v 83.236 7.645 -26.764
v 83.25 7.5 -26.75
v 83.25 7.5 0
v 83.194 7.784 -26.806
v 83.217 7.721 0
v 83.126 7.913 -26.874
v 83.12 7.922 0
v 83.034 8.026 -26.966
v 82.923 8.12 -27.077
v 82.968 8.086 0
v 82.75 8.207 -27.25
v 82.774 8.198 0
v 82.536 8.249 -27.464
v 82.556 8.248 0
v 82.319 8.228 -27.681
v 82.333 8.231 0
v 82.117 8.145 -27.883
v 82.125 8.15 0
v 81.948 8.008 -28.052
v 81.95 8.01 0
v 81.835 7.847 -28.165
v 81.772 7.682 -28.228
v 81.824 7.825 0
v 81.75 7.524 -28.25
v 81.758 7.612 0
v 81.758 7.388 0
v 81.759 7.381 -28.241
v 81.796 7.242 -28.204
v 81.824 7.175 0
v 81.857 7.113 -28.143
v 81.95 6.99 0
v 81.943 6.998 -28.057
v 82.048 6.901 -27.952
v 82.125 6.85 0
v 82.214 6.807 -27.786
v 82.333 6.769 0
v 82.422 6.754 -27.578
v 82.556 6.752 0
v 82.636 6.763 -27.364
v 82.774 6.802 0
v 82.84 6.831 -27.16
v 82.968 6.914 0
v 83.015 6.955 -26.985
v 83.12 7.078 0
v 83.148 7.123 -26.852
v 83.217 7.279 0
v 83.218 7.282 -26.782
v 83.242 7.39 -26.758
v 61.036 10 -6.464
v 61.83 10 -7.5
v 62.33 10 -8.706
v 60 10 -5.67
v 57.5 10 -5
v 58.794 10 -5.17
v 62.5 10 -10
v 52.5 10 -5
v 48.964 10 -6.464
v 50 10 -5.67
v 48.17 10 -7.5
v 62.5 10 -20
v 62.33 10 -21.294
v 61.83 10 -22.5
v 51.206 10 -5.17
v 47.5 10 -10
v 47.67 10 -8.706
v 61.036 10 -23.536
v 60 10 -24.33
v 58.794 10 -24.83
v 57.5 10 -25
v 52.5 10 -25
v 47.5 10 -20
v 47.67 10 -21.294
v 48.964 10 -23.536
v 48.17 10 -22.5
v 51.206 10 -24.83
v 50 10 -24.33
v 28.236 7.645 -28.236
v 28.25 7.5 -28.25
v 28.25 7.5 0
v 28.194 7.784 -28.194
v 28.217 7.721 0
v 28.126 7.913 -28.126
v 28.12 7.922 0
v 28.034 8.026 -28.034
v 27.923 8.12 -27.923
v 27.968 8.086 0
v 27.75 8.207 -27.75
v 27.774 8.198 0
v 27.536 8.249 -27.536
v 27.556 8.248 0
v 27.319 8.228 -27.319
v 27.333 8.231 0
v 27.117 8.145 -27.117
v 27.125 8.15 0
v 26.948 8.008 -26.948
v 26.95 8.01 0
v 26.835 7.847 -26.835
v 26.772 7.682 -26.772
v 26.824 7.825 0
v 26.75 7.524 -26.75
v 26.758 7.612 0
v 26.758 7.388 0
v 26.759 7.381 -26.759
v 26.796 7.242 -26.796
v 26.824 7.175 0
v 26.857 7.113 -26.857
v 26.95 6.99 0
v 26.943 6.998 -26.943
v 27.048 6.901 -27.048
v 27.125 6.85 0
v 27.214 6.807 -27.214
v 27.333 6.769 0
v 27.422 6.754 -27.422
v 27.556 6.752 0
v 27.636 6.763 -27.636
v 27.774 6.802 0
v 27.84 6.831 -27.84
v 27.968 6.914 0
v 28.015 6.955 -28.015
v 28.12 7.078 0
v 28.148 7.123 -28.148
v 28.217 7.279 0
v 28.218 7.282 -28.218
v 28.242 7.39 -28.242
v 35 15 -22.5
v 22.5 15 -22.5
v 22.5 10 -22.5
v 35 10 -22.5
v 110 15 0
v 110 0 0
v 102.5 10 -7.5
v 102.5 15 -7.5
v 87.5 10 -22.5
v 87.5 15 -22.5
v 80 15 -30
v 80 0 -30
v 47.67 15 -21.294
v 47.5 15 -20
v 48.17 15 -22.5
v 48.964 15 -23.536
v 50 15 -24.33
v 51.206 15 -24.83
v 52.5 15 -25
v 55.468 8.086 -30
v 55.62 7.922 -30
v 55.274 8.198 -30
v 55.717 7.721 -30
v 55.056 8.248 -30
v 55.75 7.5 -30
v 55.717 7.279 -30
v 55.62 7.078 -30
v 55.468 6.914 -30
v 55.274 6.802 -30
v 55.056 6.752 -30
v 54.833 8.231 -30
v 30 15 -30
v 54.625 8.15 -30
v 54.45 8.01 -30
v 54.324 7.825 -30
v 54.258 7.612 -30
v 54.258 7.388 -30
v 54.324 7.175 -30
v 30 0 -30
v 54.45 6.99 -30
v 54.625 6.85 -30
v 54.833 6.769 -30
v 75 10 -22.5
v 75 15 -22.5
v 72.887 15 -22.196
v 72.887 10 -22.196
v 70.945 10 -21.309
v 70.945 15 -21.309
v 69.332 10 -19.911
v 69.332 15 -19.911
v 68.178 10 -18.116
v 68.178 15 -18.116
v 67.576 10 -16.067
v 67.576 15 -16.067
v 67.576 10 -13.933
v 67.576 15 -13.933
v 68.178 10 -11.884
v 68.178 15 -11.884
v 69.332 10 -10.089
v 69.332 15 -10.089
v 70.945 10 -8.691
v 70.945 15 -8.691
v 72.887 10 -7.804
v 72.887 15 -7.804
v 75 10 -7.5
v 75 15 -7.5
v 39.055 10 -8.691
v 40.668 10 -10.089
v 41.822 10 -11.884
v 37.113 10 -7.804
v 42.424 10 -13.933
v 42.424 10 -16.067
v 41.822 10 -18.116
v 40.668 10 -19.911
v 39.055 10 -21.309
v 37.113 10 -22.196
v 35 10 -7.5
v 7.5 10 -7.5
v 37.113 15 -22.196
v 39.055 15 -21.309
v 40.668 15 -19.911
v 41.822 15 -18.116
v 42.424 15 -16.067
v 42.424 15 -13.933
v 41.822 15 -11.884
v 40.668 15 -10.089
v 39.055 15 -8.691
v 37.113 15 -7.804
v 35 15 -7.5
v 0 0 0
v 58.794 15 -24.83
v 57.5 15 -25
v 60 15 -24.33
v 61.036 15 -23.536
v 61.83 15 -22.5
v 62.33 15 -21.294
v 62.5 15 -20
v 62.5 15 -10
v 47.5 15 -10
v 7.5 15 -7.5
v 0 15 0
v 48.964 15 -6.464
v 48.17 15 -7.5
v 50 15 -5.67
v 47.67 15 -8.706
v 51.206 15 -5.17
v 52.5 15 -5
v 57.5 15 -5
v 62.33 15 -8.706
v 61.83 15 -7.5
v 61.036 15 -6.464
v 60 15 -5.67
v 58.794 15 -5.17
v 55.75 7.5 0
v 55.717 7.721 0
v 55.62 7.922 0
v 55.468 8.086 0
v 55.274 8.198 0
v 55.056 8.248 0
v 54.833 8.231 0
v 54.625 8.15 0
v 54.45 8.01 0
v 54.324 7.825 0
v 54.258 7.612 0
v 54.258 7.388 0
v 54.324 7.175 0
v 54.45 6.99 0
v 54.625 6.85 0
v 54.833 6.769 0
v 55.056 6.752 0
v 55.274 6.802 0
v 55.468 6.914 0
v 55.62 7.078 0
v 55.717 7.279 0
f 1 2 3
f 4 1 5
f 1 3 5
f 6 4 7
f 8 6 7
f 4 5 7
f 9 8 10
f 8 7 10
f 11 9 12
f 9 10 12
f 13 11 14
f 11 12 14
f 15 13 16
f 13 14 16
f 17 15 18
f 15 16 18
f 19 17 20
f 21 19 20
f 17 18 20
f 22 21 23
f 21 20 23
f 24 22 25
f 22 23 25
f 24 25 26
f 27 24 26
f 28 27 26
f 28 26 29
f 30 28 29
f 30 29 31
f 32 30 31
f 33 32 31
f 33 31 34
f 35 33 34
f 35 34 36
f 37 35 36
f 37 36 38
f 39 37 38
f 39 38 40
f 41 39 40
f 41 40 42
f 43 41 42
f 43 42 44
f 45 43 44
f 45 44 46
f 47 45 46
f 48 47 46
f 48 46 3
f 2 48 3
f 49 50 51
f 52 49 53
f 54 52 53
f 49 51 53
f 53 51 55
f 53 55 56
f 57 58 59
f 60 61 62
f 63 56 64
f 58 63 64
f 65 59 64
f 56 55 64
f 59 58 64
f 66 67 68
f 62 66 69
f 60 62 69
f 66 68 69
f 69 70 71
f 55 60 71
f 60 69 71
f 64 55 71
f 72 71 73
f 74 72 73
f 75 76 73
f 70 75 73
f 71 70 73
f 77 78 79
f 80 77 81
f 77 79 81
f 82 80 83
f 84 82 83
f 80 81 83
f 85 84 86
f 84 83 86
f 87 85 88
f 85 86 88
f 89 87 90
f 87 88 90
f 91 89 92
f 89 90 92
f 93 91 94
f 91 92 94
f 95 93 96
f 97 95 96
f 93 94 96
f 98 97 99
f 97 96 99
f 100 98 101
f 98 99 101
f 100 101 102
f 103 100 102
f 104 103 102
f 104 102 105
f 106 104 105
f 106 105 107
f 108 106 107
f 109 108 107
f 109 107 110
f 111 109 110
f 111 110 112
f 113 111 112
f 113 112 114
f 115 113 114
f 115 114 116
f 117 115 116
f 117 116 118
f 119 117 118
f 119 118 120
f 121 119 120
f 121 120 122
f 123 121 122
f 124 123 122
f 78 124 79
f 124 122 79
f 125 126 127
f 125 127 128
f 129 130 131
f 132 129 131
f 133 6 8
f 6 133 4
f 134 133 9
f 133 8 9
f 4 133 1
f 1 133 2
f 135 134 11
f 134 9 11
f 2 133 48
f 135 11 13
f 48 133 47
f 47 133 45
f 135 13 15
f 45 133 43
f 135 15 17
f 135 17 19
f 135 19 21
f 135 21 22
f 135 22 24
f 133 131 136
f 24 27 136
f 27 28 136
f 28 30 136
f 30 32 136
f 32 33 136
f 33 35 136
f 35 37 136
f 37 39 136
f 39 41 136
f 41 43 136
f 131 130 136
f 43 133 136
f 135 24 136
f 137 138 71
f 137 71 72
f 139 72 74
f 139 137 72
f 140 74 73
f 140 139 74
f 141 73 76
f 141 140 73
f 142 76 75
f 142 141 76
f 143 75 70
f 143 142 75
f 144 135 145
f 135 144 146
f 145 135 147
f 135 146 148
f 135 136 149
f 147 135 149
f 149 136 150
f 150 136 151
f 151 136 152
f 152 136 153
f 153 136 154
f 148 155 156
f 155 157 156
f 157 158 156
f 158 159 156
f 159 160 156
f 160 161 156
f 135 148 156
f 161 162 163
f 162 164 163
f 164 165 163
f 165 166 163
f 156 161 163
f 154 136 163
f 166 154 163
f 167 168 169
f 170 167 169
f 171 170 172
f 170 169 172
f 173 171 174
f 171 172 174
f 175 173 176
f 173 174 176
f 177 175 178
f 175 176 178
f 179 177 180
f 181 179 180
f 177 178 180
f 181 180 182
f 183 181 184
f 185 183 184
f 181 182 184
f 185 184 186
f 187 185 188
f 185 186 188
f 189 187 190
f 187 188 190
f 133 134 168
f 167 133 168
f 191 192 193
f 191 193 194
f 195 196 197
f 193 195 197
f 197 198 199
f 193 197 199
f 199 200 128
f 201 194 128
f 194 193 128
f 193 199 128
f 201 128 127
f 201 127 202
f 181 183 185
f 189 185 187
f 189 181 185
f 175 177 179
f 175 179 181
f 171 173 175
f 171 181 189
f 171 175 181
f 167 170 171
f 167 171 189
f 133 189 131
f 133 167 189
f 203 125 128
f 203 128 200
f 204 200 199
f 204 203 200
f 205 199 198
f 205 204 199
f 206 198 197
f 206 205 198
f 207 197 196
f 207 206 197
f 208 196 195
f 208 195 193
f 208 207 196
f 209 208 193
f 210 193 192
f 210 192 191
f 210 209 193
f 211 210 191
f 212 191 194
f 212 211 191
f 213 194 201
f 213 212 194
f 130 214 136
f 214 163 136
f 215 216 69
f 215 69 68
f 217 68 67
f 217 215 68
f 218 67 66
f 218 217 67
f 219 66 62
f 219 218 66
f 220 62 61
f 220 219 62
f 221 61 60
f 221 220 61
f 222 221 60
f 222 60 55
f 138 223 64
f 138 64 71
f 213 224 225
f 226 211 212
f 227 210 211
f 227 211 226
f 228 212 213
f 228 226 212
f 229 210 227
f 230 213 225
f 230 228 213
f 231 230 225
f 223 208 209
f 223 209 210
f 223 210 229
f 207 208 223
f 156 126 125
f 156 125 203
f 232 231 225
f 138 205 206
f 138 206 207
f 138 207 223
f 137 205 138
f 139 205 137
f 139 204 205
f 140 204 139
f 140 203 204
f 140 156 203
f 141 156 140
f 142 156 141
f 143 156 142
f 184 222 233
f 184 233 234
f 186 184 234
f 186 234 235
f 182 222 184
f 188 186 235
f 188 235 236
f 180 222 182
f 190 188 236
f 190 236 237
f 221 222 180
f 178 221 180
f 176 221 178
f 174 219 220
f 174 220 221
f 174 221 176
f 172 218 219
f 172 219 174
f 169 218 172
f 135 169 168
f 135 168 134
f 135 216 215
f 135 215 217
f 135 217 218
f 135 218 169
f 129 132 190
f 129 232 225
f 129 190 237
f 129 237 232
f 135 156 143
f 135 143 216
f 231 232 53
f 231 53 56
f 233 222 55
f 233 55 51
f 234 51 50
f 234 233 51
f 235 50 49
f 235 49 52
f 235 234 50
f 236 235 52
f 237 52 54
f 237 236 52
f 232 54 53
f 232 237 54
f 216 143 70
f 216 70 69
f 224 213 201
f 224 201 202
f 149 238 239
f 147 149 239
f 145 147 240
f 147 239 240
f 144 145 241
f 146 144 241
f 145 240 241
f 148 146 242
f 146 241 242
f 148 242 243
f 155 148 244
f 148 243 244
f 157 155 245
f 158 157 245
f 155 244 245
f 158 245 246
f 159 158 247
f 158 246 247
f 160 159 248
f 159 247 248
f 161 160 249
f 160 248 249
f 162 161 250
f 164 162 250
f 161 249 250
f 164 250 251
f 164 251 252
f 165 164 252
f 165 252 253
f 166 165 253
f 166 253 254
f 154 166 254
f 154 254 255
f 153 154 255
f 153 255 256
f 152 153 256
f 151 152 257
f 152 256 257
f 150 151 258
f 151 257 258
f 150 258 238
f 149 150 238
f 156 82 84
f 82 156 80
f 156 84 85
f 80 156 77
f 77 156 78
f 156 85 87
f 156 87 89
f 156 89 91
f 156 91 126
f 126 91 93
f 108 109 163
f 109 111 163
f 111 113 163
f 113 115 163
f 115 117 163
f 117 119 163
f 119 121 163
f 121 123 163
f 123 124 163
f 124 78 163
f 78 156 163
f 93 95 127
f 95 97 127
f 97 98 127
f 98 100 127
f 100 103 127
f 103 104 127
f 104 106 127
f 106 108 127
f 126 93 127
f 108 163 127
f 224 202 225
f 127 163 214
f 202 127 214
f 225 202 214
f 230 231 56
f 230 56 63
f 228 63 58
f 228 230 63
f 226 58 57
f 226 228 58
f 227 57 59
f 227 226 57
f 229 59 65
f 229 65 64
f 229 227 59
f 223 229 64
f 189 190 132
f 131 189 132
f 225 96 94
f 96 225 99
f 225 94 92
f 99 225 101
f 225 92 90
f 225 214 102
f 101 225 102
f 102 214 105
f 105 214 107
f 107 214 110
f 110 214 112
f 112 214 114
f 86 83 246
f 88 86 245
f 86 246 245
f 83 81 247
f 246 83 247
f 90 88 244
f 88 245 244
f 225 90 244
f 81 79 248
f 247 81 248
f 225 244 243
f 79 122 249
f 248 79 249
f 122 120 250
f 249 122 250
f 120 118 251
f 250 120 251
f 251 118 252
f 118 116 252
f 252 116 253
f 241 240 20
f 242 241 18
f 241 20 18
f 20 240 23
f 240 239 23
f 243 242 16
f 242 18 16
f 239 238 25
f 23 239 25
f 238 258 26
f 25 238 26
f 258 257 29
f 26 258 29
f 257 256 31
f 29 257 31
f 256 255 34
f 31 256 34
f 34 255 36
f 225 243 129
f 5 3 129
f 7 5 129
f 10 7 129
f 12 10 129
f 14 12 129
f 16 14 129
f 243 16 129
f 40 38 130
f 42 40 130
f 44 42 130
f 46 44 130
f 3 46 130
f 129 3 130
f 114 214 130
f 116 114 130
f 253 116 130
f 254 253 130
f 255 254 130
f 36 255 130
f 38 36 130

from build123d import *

# Parameters (mm, degrees)
BOSS_EXTRUDE1_DEPTH = 15
CUT_EXTRUDE1_DEPTH  = 5
SKETCH3_R           = 0.75
CUT_EXTRUDE2_DEPTH  = 30
CUT_EXTRUDE3_DEPTH  = 5


with BuildPart() as part:
    # Sketch1 → Boss-Extrude1 (new body)
    with BuildSketch(Plane(origin=(0, 0, 0), x_dir=(1, 0, 0), z_dir=(0, 1, 0))):
        Polygon((0, 0), (110, 0), (80, 30), (30, 30), align=None)
    extrude(amount=BOSS_EXTRUDE1_DEPTH)

    # Sketch2 → Cut-Extrude1 (cut)
    with BuildSketch(Plane(origin=(0, 15, 0), x_dir=(1, 0, 0), z_dir=(0, 1, 0))):
        with BuildLine():
            Line((-5, 22.5), (35, 22.5))
            ThreePointArc((35, 22.5), (42.5, 15), (35, 7.5))
            Line((35, 7.5), (-5, 7.5))
            ThreePointArc((-5, 7.5), (-12.5, 15), (-5, 22.5))
        make_face()
        with BuildLine():
            Line((115, 22.5), (75, 22.5))
            ThreePointArc((75, 22.5), (67.5, 15), (75, 7.5))
            Line((75, 7.5), (115, 7.5))
            ThreePointArc((115, 7.5), (122.5, 15), (115, 22.5))
        make_face()
    extrude(amount=-CUT_EXTRUDE1_DEPTH, mode=Mode.SUBTRACT)

    # Sketch3 → Cut-Extrude2 (cut)
    with BuildSketch(Plane.XY):
        with Locations((27.5, 7.5)):
            Circle(SKETCH3_R)
        with Locations((55, 7.5)):
            Circle(SKETCH3_R)
        with Locations((82.5, 7.5)):
            Circle(SKETCH3_R)
    extrude(amount=-CUT_EXTRUDE2_DEPTH, mode=Mode.SUBTRACT)

    # Sketch4 → Cut-Extrude3 (cut)
    with BuildSketch(Plane(origin=(0, 15, 0), x_dir=(1, 0, 0), z_dir=(0, 1, 0))):
        with BuildLine():
            Line((52.5, 25), (57.5, 25))
            ThreePointArc((57.5, 25), (61.035533906, 23.535533906), (62.5, 20))
            Line((62.5, 20), (62.5, 10))
            ThreePointArc((62.5, 10), (61.035533906, 6.464466094), (57.5, 5))
            Line((57.5, 5), (52.5, 5))
            ThreePointArc((52.5, 5), (48.964466094, 6.464466094), (47.5, 10))
            Line((47.5, 10), (47.5, 20))
            ThreePointArc((47.5, 20), (48.964466094, 23.535533906), (52.5, 25))
        make_face()
    extrude(amount=-CUT_EXTRUDE3_DEPTH, mode=Mode.SUBTRACT)


solid = part.part
